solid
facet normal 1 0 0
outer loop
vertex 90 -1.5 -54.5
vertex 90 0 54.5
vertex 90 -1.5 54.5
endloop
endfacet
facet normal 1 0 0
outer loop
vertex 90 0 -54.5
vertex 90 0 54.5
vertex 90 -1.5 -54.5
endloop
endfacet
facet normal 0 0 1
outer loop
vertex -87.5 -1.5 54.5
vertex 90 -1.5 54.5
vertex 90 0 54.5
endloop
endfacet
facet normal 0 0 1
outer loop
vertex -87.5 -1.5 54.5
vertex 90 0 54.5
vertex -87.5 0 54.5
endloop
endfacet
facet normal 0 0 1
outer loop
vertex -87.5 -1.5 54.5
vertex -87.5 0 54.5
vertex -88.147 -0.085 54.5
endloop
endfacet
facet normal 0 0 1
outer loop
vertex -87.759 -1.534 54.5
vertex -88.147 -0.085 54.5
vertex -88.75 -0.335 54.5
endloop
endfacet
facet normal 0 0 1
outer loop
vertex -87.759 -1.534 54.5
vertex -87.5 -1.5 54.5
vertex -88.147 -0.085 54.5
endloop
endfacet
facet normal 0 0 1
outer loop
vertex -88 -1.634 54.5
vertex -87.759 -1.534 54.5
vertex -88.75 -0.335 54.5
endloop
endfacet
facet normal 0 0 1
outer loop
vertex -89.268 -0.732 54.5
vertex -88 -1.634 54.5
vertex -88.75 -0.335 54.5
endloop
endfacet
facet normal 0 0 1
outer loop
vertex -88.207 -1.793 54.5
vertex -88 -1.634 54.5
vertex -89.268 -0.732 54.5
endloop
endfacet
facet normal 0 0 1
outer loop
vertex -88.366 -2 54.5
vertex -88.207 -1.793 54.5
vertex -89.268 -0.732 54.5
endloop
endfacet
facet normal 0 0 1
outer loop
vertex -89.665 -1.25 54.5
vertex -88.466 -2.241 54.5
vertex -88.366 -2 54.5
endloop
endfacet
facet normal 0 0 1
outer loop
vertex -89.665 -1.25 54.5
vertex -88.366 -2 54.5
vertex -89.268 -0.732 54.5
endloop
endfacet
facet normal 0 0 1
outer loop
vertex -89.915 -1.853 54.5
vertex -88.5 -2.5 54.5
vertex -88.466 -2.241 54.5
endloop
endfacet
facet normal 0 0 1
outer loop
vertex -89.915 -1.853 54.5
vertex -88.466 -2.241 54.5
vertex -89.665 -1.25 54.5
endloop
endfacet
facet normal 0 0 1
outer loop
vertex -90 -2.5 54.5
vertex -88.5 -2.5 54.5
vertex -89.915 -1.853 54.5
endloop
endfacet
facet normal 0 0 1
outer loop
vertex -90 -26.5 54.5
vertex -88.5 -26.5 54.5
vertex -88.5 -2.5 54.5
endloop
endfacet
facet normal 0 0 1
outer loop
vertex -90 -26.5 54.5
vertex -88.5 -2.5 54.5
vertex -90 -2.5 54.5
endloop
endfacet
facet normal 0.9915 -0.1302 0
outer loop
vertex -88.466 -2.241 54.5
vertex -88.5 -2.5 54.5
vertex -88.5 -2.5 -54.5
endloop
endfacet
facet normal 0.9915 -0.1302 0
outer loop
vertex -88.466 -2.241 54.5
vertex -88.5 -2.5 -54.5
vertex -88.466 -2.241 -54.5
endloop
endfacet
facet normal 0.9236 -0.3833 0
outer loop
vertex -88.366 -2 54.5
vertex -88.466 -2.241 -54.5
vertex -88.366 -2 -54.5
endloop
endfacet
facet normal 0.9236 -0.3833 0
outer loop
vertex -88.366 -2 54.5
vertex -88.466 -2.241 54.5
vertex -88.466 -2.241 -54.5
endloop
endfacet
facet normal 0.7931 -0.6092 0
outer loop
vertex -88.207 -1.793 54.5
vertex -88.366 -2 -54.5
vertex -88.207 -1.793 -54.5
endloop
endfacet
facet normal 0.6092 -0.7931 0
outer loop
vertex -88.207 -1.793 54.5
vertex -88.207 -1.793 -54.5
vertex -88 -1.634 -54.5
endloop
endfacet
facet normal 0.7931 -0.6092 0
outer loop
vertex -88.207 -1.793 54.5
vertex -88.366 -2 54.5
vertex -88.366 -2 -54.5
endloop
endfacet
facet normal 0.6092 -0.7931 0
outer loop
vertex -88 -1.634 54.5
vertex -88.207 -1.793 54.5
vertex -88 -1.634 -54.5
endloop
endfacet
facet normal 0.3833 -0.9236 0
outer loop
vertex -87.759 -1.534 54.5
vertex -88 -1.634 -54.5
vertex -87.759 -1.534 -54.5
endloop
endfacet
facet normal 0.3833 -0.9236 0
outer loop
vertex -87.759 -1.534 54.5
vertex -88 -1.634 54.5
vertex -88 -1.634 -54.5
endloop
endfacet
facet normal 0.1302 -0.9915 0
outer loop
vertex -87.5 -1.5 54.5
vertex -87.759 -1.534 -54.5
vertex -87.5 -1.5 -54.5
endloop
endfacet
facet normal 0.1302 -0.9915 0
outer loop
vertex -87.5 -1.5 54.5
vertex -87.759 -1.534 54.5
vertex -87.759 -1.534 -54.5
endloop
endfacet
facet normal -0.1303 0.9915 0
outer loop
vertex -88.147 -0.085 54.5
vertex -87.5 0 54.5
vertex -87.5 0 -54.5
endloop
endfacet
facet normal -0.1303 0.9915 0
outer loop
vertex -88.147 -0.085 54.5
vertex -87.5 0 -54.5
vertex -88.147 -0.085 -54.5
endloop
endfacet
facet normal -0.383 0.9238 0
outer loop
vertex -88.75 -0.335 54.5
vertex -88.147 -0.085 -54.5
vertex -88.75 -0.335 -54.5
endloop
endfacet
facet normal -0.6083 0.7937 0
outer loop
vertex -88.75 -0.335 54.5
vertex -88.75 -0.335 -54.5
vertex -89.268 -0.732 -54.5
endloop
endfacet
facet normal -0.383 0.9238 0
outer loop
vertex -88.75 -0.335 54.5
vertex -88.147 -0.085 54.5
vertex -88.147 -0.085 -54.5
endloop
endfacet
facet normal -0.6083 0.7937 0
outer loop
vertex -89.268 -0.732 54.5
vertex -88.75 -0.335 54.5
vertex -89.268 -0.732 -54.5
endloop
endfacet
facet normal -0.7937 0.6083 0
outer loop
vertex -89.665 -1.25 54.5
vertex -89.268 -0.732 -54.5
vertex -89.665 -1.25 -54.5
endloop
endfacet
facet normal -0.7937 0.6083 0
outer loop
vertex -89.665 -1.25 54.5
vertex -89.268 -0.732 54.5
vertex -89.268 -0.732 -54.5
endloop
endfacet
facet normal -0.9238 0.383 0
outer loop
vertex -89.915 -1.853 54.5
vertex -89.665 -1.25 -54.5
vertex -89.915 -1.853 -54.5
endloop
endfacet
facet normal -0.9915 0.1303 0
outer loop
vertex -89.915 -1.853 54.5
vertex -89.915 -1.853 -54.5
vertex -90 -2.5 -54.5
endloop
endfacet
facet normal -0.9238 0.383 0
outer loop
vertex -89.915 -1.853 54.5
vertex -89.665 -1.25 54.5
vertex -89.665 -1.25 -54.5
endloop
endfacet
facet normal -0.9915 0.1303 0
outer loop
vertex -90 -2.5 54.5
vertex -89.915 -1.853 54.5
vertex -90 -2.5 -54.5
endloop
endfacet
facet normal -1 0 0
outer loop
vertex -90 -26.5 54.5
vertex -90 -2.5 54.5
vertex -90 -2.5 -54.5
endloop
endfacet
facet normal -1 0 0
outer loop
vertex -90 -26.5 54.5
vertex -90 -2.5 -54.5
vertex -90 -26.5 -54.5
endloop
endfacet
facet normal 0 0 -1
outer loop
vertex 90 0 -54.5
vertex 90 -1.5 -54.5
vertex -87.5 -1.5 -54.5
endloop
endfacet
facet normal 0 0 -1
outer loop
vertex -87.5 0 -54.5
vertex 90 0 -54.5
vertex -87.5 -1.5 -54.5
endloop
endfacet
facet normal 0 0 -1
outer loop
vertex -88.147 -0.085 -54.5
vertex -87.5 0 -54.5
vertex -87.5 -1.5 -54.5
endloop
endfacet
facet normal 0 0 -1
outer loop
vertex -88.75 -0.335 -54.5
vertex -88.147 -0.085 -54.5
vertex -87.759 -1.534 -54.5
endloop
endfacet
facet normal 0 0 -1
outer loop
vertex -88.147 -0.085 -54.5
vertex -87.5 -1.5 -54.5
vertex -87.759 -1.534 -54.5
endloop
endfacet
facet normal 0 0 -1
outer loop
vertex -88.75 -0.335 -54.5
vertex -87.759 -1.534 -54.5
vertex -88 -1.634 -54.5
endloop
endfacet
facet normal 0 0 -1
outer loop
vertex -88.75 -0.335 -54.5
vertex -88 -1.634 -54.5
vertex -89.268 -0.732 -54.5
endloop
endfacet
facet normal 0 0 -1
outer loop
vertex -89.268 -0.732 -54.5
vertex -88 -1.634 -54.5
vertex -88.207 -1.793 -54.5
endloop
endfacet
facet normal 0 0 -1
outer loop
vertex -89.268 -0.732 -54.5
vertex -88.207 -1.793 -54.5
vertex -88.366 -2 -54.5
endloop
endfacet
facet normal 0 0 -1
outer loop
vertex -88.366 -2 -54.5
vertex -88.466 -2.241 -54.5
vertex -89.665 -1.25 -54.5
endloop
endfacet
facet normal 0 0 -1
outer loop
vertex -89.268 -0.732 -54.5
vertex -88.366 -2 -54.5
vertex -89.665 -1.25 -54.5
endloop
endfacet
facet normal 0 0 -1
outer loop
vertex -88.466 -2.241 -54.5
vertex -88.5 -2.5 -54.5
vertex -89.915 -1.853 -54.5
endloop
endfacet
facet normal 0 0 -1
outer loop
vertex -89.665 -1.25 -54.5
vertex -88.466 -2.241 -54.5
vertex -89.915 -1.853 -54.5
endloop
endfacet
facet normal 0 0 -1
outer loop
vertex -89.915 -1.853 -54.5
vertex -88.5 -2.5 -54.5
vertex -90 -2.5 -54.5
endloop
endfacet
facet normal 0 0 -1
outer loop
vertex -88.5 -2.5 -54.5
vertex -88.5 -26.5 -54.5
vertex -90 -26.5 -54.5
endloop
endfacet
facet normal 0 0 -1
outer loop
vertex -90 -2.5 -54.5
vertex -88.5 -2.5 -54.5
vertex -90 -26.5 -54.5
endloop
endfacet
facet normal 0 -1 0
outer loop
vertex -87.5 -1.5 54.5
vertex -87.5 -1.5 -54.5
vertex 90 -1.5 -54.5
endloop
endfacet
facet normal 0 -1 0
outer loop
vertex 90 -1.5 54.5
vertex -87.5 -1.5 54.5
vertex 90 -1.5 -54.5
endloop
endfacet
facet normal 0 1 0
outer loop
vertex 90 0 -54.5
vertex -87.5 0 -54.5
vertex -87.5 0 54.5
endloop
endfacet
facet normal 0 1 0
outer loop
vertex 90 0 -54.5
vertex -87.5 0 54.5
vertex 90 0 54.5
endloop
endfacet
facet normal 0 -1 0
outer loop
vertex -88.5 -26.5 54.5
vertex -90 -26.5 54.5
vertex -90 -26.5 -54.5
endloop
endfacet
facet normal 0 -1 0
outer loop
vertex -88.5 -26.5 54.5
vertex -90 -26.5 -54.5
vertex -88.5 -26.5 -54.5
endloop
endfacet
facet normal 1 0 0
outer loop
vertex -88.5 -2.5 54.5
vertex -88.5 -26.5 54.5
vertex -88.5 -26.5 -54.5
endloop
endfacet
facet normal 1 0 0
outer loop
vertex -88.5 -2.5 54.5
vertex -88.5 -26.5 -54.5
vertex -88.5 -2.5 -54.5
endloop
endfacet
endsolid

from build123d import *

# Parameters (mm, degrees)
SKETCH_1_W                       = 180
SKETCH_1_H                       = 109
SM_BASE_FLANGE_1_DEPTH           = 1.5
SM_EDGE_FLANGE_1_STRIP_W         = 8
SM_EDGE_FLANGE_1_STRIP_H         = 1.5
SM_EDGE_FLANGE_1_STRIP_CUT_DEPTH = 109
SM_EDGE_FLANGE_1_DEPTH           = 109


# Sheet-metal steps are written as plain solids
with BuildPart() as part:
    # Sketch 1 → 基体-法兰1 (new body)
    with BuildSketch(Plane(origin=(0, 0, 0), x_dir=(1, 0, 0), z_dir=(0, 1, 0))):
        Rectangle(SKETCH_1_W, SKETCH_1_H)
    extrude(amount=-SM_BASE_FLANGE_1_DEPTH)

    # 边线-法兰1 strip (across the edge) → 边线-法兰1 strip cut (cut)
    with BuildSketch(Plane(origin=(-90, -1.5, 54.5), x_dir=(1, 0, 0), z_dir=(0, 0, -1))):
        with Locations((-1.5, -0.75)):
            Rectangle(SM_EDGE_FLANGE_1_STRIP_W, SM_EDGE_FLANGE_1_STRIP_H)
    extrude(amount=SM_EDGE_FLANGE_1_STRIP_CUT_DEPTH, mode=Mode.SUBTRACT)

    # 边线-法兰1 section (across the edge) → 边线-法兰1 (add)
    with BuildSketch(Plane(origin=(-90, -1.5, 54.5), x_dir=(1, 0, 0), z_dir=(0, 0, -1))):
        with BuildLine():
            Line((0, 1), (0, 25))
            Line((0, 25), (1.5, 25))
            Line((1.5, 25), (1.5, 1))
            ThreePointArc((1.5, 1), (1.792893219, 0.292893219), (2.5, 0))
            Line((2.5, 0), (2.5, -1.5))
            ThreePointArc((2.5, -1.5), (0.732233047, -0.767766953), (0, 1))
        make_face()
    extrude(amount=SM_EDGE_FLANGE_1_DEPTH)


solid = part.part
